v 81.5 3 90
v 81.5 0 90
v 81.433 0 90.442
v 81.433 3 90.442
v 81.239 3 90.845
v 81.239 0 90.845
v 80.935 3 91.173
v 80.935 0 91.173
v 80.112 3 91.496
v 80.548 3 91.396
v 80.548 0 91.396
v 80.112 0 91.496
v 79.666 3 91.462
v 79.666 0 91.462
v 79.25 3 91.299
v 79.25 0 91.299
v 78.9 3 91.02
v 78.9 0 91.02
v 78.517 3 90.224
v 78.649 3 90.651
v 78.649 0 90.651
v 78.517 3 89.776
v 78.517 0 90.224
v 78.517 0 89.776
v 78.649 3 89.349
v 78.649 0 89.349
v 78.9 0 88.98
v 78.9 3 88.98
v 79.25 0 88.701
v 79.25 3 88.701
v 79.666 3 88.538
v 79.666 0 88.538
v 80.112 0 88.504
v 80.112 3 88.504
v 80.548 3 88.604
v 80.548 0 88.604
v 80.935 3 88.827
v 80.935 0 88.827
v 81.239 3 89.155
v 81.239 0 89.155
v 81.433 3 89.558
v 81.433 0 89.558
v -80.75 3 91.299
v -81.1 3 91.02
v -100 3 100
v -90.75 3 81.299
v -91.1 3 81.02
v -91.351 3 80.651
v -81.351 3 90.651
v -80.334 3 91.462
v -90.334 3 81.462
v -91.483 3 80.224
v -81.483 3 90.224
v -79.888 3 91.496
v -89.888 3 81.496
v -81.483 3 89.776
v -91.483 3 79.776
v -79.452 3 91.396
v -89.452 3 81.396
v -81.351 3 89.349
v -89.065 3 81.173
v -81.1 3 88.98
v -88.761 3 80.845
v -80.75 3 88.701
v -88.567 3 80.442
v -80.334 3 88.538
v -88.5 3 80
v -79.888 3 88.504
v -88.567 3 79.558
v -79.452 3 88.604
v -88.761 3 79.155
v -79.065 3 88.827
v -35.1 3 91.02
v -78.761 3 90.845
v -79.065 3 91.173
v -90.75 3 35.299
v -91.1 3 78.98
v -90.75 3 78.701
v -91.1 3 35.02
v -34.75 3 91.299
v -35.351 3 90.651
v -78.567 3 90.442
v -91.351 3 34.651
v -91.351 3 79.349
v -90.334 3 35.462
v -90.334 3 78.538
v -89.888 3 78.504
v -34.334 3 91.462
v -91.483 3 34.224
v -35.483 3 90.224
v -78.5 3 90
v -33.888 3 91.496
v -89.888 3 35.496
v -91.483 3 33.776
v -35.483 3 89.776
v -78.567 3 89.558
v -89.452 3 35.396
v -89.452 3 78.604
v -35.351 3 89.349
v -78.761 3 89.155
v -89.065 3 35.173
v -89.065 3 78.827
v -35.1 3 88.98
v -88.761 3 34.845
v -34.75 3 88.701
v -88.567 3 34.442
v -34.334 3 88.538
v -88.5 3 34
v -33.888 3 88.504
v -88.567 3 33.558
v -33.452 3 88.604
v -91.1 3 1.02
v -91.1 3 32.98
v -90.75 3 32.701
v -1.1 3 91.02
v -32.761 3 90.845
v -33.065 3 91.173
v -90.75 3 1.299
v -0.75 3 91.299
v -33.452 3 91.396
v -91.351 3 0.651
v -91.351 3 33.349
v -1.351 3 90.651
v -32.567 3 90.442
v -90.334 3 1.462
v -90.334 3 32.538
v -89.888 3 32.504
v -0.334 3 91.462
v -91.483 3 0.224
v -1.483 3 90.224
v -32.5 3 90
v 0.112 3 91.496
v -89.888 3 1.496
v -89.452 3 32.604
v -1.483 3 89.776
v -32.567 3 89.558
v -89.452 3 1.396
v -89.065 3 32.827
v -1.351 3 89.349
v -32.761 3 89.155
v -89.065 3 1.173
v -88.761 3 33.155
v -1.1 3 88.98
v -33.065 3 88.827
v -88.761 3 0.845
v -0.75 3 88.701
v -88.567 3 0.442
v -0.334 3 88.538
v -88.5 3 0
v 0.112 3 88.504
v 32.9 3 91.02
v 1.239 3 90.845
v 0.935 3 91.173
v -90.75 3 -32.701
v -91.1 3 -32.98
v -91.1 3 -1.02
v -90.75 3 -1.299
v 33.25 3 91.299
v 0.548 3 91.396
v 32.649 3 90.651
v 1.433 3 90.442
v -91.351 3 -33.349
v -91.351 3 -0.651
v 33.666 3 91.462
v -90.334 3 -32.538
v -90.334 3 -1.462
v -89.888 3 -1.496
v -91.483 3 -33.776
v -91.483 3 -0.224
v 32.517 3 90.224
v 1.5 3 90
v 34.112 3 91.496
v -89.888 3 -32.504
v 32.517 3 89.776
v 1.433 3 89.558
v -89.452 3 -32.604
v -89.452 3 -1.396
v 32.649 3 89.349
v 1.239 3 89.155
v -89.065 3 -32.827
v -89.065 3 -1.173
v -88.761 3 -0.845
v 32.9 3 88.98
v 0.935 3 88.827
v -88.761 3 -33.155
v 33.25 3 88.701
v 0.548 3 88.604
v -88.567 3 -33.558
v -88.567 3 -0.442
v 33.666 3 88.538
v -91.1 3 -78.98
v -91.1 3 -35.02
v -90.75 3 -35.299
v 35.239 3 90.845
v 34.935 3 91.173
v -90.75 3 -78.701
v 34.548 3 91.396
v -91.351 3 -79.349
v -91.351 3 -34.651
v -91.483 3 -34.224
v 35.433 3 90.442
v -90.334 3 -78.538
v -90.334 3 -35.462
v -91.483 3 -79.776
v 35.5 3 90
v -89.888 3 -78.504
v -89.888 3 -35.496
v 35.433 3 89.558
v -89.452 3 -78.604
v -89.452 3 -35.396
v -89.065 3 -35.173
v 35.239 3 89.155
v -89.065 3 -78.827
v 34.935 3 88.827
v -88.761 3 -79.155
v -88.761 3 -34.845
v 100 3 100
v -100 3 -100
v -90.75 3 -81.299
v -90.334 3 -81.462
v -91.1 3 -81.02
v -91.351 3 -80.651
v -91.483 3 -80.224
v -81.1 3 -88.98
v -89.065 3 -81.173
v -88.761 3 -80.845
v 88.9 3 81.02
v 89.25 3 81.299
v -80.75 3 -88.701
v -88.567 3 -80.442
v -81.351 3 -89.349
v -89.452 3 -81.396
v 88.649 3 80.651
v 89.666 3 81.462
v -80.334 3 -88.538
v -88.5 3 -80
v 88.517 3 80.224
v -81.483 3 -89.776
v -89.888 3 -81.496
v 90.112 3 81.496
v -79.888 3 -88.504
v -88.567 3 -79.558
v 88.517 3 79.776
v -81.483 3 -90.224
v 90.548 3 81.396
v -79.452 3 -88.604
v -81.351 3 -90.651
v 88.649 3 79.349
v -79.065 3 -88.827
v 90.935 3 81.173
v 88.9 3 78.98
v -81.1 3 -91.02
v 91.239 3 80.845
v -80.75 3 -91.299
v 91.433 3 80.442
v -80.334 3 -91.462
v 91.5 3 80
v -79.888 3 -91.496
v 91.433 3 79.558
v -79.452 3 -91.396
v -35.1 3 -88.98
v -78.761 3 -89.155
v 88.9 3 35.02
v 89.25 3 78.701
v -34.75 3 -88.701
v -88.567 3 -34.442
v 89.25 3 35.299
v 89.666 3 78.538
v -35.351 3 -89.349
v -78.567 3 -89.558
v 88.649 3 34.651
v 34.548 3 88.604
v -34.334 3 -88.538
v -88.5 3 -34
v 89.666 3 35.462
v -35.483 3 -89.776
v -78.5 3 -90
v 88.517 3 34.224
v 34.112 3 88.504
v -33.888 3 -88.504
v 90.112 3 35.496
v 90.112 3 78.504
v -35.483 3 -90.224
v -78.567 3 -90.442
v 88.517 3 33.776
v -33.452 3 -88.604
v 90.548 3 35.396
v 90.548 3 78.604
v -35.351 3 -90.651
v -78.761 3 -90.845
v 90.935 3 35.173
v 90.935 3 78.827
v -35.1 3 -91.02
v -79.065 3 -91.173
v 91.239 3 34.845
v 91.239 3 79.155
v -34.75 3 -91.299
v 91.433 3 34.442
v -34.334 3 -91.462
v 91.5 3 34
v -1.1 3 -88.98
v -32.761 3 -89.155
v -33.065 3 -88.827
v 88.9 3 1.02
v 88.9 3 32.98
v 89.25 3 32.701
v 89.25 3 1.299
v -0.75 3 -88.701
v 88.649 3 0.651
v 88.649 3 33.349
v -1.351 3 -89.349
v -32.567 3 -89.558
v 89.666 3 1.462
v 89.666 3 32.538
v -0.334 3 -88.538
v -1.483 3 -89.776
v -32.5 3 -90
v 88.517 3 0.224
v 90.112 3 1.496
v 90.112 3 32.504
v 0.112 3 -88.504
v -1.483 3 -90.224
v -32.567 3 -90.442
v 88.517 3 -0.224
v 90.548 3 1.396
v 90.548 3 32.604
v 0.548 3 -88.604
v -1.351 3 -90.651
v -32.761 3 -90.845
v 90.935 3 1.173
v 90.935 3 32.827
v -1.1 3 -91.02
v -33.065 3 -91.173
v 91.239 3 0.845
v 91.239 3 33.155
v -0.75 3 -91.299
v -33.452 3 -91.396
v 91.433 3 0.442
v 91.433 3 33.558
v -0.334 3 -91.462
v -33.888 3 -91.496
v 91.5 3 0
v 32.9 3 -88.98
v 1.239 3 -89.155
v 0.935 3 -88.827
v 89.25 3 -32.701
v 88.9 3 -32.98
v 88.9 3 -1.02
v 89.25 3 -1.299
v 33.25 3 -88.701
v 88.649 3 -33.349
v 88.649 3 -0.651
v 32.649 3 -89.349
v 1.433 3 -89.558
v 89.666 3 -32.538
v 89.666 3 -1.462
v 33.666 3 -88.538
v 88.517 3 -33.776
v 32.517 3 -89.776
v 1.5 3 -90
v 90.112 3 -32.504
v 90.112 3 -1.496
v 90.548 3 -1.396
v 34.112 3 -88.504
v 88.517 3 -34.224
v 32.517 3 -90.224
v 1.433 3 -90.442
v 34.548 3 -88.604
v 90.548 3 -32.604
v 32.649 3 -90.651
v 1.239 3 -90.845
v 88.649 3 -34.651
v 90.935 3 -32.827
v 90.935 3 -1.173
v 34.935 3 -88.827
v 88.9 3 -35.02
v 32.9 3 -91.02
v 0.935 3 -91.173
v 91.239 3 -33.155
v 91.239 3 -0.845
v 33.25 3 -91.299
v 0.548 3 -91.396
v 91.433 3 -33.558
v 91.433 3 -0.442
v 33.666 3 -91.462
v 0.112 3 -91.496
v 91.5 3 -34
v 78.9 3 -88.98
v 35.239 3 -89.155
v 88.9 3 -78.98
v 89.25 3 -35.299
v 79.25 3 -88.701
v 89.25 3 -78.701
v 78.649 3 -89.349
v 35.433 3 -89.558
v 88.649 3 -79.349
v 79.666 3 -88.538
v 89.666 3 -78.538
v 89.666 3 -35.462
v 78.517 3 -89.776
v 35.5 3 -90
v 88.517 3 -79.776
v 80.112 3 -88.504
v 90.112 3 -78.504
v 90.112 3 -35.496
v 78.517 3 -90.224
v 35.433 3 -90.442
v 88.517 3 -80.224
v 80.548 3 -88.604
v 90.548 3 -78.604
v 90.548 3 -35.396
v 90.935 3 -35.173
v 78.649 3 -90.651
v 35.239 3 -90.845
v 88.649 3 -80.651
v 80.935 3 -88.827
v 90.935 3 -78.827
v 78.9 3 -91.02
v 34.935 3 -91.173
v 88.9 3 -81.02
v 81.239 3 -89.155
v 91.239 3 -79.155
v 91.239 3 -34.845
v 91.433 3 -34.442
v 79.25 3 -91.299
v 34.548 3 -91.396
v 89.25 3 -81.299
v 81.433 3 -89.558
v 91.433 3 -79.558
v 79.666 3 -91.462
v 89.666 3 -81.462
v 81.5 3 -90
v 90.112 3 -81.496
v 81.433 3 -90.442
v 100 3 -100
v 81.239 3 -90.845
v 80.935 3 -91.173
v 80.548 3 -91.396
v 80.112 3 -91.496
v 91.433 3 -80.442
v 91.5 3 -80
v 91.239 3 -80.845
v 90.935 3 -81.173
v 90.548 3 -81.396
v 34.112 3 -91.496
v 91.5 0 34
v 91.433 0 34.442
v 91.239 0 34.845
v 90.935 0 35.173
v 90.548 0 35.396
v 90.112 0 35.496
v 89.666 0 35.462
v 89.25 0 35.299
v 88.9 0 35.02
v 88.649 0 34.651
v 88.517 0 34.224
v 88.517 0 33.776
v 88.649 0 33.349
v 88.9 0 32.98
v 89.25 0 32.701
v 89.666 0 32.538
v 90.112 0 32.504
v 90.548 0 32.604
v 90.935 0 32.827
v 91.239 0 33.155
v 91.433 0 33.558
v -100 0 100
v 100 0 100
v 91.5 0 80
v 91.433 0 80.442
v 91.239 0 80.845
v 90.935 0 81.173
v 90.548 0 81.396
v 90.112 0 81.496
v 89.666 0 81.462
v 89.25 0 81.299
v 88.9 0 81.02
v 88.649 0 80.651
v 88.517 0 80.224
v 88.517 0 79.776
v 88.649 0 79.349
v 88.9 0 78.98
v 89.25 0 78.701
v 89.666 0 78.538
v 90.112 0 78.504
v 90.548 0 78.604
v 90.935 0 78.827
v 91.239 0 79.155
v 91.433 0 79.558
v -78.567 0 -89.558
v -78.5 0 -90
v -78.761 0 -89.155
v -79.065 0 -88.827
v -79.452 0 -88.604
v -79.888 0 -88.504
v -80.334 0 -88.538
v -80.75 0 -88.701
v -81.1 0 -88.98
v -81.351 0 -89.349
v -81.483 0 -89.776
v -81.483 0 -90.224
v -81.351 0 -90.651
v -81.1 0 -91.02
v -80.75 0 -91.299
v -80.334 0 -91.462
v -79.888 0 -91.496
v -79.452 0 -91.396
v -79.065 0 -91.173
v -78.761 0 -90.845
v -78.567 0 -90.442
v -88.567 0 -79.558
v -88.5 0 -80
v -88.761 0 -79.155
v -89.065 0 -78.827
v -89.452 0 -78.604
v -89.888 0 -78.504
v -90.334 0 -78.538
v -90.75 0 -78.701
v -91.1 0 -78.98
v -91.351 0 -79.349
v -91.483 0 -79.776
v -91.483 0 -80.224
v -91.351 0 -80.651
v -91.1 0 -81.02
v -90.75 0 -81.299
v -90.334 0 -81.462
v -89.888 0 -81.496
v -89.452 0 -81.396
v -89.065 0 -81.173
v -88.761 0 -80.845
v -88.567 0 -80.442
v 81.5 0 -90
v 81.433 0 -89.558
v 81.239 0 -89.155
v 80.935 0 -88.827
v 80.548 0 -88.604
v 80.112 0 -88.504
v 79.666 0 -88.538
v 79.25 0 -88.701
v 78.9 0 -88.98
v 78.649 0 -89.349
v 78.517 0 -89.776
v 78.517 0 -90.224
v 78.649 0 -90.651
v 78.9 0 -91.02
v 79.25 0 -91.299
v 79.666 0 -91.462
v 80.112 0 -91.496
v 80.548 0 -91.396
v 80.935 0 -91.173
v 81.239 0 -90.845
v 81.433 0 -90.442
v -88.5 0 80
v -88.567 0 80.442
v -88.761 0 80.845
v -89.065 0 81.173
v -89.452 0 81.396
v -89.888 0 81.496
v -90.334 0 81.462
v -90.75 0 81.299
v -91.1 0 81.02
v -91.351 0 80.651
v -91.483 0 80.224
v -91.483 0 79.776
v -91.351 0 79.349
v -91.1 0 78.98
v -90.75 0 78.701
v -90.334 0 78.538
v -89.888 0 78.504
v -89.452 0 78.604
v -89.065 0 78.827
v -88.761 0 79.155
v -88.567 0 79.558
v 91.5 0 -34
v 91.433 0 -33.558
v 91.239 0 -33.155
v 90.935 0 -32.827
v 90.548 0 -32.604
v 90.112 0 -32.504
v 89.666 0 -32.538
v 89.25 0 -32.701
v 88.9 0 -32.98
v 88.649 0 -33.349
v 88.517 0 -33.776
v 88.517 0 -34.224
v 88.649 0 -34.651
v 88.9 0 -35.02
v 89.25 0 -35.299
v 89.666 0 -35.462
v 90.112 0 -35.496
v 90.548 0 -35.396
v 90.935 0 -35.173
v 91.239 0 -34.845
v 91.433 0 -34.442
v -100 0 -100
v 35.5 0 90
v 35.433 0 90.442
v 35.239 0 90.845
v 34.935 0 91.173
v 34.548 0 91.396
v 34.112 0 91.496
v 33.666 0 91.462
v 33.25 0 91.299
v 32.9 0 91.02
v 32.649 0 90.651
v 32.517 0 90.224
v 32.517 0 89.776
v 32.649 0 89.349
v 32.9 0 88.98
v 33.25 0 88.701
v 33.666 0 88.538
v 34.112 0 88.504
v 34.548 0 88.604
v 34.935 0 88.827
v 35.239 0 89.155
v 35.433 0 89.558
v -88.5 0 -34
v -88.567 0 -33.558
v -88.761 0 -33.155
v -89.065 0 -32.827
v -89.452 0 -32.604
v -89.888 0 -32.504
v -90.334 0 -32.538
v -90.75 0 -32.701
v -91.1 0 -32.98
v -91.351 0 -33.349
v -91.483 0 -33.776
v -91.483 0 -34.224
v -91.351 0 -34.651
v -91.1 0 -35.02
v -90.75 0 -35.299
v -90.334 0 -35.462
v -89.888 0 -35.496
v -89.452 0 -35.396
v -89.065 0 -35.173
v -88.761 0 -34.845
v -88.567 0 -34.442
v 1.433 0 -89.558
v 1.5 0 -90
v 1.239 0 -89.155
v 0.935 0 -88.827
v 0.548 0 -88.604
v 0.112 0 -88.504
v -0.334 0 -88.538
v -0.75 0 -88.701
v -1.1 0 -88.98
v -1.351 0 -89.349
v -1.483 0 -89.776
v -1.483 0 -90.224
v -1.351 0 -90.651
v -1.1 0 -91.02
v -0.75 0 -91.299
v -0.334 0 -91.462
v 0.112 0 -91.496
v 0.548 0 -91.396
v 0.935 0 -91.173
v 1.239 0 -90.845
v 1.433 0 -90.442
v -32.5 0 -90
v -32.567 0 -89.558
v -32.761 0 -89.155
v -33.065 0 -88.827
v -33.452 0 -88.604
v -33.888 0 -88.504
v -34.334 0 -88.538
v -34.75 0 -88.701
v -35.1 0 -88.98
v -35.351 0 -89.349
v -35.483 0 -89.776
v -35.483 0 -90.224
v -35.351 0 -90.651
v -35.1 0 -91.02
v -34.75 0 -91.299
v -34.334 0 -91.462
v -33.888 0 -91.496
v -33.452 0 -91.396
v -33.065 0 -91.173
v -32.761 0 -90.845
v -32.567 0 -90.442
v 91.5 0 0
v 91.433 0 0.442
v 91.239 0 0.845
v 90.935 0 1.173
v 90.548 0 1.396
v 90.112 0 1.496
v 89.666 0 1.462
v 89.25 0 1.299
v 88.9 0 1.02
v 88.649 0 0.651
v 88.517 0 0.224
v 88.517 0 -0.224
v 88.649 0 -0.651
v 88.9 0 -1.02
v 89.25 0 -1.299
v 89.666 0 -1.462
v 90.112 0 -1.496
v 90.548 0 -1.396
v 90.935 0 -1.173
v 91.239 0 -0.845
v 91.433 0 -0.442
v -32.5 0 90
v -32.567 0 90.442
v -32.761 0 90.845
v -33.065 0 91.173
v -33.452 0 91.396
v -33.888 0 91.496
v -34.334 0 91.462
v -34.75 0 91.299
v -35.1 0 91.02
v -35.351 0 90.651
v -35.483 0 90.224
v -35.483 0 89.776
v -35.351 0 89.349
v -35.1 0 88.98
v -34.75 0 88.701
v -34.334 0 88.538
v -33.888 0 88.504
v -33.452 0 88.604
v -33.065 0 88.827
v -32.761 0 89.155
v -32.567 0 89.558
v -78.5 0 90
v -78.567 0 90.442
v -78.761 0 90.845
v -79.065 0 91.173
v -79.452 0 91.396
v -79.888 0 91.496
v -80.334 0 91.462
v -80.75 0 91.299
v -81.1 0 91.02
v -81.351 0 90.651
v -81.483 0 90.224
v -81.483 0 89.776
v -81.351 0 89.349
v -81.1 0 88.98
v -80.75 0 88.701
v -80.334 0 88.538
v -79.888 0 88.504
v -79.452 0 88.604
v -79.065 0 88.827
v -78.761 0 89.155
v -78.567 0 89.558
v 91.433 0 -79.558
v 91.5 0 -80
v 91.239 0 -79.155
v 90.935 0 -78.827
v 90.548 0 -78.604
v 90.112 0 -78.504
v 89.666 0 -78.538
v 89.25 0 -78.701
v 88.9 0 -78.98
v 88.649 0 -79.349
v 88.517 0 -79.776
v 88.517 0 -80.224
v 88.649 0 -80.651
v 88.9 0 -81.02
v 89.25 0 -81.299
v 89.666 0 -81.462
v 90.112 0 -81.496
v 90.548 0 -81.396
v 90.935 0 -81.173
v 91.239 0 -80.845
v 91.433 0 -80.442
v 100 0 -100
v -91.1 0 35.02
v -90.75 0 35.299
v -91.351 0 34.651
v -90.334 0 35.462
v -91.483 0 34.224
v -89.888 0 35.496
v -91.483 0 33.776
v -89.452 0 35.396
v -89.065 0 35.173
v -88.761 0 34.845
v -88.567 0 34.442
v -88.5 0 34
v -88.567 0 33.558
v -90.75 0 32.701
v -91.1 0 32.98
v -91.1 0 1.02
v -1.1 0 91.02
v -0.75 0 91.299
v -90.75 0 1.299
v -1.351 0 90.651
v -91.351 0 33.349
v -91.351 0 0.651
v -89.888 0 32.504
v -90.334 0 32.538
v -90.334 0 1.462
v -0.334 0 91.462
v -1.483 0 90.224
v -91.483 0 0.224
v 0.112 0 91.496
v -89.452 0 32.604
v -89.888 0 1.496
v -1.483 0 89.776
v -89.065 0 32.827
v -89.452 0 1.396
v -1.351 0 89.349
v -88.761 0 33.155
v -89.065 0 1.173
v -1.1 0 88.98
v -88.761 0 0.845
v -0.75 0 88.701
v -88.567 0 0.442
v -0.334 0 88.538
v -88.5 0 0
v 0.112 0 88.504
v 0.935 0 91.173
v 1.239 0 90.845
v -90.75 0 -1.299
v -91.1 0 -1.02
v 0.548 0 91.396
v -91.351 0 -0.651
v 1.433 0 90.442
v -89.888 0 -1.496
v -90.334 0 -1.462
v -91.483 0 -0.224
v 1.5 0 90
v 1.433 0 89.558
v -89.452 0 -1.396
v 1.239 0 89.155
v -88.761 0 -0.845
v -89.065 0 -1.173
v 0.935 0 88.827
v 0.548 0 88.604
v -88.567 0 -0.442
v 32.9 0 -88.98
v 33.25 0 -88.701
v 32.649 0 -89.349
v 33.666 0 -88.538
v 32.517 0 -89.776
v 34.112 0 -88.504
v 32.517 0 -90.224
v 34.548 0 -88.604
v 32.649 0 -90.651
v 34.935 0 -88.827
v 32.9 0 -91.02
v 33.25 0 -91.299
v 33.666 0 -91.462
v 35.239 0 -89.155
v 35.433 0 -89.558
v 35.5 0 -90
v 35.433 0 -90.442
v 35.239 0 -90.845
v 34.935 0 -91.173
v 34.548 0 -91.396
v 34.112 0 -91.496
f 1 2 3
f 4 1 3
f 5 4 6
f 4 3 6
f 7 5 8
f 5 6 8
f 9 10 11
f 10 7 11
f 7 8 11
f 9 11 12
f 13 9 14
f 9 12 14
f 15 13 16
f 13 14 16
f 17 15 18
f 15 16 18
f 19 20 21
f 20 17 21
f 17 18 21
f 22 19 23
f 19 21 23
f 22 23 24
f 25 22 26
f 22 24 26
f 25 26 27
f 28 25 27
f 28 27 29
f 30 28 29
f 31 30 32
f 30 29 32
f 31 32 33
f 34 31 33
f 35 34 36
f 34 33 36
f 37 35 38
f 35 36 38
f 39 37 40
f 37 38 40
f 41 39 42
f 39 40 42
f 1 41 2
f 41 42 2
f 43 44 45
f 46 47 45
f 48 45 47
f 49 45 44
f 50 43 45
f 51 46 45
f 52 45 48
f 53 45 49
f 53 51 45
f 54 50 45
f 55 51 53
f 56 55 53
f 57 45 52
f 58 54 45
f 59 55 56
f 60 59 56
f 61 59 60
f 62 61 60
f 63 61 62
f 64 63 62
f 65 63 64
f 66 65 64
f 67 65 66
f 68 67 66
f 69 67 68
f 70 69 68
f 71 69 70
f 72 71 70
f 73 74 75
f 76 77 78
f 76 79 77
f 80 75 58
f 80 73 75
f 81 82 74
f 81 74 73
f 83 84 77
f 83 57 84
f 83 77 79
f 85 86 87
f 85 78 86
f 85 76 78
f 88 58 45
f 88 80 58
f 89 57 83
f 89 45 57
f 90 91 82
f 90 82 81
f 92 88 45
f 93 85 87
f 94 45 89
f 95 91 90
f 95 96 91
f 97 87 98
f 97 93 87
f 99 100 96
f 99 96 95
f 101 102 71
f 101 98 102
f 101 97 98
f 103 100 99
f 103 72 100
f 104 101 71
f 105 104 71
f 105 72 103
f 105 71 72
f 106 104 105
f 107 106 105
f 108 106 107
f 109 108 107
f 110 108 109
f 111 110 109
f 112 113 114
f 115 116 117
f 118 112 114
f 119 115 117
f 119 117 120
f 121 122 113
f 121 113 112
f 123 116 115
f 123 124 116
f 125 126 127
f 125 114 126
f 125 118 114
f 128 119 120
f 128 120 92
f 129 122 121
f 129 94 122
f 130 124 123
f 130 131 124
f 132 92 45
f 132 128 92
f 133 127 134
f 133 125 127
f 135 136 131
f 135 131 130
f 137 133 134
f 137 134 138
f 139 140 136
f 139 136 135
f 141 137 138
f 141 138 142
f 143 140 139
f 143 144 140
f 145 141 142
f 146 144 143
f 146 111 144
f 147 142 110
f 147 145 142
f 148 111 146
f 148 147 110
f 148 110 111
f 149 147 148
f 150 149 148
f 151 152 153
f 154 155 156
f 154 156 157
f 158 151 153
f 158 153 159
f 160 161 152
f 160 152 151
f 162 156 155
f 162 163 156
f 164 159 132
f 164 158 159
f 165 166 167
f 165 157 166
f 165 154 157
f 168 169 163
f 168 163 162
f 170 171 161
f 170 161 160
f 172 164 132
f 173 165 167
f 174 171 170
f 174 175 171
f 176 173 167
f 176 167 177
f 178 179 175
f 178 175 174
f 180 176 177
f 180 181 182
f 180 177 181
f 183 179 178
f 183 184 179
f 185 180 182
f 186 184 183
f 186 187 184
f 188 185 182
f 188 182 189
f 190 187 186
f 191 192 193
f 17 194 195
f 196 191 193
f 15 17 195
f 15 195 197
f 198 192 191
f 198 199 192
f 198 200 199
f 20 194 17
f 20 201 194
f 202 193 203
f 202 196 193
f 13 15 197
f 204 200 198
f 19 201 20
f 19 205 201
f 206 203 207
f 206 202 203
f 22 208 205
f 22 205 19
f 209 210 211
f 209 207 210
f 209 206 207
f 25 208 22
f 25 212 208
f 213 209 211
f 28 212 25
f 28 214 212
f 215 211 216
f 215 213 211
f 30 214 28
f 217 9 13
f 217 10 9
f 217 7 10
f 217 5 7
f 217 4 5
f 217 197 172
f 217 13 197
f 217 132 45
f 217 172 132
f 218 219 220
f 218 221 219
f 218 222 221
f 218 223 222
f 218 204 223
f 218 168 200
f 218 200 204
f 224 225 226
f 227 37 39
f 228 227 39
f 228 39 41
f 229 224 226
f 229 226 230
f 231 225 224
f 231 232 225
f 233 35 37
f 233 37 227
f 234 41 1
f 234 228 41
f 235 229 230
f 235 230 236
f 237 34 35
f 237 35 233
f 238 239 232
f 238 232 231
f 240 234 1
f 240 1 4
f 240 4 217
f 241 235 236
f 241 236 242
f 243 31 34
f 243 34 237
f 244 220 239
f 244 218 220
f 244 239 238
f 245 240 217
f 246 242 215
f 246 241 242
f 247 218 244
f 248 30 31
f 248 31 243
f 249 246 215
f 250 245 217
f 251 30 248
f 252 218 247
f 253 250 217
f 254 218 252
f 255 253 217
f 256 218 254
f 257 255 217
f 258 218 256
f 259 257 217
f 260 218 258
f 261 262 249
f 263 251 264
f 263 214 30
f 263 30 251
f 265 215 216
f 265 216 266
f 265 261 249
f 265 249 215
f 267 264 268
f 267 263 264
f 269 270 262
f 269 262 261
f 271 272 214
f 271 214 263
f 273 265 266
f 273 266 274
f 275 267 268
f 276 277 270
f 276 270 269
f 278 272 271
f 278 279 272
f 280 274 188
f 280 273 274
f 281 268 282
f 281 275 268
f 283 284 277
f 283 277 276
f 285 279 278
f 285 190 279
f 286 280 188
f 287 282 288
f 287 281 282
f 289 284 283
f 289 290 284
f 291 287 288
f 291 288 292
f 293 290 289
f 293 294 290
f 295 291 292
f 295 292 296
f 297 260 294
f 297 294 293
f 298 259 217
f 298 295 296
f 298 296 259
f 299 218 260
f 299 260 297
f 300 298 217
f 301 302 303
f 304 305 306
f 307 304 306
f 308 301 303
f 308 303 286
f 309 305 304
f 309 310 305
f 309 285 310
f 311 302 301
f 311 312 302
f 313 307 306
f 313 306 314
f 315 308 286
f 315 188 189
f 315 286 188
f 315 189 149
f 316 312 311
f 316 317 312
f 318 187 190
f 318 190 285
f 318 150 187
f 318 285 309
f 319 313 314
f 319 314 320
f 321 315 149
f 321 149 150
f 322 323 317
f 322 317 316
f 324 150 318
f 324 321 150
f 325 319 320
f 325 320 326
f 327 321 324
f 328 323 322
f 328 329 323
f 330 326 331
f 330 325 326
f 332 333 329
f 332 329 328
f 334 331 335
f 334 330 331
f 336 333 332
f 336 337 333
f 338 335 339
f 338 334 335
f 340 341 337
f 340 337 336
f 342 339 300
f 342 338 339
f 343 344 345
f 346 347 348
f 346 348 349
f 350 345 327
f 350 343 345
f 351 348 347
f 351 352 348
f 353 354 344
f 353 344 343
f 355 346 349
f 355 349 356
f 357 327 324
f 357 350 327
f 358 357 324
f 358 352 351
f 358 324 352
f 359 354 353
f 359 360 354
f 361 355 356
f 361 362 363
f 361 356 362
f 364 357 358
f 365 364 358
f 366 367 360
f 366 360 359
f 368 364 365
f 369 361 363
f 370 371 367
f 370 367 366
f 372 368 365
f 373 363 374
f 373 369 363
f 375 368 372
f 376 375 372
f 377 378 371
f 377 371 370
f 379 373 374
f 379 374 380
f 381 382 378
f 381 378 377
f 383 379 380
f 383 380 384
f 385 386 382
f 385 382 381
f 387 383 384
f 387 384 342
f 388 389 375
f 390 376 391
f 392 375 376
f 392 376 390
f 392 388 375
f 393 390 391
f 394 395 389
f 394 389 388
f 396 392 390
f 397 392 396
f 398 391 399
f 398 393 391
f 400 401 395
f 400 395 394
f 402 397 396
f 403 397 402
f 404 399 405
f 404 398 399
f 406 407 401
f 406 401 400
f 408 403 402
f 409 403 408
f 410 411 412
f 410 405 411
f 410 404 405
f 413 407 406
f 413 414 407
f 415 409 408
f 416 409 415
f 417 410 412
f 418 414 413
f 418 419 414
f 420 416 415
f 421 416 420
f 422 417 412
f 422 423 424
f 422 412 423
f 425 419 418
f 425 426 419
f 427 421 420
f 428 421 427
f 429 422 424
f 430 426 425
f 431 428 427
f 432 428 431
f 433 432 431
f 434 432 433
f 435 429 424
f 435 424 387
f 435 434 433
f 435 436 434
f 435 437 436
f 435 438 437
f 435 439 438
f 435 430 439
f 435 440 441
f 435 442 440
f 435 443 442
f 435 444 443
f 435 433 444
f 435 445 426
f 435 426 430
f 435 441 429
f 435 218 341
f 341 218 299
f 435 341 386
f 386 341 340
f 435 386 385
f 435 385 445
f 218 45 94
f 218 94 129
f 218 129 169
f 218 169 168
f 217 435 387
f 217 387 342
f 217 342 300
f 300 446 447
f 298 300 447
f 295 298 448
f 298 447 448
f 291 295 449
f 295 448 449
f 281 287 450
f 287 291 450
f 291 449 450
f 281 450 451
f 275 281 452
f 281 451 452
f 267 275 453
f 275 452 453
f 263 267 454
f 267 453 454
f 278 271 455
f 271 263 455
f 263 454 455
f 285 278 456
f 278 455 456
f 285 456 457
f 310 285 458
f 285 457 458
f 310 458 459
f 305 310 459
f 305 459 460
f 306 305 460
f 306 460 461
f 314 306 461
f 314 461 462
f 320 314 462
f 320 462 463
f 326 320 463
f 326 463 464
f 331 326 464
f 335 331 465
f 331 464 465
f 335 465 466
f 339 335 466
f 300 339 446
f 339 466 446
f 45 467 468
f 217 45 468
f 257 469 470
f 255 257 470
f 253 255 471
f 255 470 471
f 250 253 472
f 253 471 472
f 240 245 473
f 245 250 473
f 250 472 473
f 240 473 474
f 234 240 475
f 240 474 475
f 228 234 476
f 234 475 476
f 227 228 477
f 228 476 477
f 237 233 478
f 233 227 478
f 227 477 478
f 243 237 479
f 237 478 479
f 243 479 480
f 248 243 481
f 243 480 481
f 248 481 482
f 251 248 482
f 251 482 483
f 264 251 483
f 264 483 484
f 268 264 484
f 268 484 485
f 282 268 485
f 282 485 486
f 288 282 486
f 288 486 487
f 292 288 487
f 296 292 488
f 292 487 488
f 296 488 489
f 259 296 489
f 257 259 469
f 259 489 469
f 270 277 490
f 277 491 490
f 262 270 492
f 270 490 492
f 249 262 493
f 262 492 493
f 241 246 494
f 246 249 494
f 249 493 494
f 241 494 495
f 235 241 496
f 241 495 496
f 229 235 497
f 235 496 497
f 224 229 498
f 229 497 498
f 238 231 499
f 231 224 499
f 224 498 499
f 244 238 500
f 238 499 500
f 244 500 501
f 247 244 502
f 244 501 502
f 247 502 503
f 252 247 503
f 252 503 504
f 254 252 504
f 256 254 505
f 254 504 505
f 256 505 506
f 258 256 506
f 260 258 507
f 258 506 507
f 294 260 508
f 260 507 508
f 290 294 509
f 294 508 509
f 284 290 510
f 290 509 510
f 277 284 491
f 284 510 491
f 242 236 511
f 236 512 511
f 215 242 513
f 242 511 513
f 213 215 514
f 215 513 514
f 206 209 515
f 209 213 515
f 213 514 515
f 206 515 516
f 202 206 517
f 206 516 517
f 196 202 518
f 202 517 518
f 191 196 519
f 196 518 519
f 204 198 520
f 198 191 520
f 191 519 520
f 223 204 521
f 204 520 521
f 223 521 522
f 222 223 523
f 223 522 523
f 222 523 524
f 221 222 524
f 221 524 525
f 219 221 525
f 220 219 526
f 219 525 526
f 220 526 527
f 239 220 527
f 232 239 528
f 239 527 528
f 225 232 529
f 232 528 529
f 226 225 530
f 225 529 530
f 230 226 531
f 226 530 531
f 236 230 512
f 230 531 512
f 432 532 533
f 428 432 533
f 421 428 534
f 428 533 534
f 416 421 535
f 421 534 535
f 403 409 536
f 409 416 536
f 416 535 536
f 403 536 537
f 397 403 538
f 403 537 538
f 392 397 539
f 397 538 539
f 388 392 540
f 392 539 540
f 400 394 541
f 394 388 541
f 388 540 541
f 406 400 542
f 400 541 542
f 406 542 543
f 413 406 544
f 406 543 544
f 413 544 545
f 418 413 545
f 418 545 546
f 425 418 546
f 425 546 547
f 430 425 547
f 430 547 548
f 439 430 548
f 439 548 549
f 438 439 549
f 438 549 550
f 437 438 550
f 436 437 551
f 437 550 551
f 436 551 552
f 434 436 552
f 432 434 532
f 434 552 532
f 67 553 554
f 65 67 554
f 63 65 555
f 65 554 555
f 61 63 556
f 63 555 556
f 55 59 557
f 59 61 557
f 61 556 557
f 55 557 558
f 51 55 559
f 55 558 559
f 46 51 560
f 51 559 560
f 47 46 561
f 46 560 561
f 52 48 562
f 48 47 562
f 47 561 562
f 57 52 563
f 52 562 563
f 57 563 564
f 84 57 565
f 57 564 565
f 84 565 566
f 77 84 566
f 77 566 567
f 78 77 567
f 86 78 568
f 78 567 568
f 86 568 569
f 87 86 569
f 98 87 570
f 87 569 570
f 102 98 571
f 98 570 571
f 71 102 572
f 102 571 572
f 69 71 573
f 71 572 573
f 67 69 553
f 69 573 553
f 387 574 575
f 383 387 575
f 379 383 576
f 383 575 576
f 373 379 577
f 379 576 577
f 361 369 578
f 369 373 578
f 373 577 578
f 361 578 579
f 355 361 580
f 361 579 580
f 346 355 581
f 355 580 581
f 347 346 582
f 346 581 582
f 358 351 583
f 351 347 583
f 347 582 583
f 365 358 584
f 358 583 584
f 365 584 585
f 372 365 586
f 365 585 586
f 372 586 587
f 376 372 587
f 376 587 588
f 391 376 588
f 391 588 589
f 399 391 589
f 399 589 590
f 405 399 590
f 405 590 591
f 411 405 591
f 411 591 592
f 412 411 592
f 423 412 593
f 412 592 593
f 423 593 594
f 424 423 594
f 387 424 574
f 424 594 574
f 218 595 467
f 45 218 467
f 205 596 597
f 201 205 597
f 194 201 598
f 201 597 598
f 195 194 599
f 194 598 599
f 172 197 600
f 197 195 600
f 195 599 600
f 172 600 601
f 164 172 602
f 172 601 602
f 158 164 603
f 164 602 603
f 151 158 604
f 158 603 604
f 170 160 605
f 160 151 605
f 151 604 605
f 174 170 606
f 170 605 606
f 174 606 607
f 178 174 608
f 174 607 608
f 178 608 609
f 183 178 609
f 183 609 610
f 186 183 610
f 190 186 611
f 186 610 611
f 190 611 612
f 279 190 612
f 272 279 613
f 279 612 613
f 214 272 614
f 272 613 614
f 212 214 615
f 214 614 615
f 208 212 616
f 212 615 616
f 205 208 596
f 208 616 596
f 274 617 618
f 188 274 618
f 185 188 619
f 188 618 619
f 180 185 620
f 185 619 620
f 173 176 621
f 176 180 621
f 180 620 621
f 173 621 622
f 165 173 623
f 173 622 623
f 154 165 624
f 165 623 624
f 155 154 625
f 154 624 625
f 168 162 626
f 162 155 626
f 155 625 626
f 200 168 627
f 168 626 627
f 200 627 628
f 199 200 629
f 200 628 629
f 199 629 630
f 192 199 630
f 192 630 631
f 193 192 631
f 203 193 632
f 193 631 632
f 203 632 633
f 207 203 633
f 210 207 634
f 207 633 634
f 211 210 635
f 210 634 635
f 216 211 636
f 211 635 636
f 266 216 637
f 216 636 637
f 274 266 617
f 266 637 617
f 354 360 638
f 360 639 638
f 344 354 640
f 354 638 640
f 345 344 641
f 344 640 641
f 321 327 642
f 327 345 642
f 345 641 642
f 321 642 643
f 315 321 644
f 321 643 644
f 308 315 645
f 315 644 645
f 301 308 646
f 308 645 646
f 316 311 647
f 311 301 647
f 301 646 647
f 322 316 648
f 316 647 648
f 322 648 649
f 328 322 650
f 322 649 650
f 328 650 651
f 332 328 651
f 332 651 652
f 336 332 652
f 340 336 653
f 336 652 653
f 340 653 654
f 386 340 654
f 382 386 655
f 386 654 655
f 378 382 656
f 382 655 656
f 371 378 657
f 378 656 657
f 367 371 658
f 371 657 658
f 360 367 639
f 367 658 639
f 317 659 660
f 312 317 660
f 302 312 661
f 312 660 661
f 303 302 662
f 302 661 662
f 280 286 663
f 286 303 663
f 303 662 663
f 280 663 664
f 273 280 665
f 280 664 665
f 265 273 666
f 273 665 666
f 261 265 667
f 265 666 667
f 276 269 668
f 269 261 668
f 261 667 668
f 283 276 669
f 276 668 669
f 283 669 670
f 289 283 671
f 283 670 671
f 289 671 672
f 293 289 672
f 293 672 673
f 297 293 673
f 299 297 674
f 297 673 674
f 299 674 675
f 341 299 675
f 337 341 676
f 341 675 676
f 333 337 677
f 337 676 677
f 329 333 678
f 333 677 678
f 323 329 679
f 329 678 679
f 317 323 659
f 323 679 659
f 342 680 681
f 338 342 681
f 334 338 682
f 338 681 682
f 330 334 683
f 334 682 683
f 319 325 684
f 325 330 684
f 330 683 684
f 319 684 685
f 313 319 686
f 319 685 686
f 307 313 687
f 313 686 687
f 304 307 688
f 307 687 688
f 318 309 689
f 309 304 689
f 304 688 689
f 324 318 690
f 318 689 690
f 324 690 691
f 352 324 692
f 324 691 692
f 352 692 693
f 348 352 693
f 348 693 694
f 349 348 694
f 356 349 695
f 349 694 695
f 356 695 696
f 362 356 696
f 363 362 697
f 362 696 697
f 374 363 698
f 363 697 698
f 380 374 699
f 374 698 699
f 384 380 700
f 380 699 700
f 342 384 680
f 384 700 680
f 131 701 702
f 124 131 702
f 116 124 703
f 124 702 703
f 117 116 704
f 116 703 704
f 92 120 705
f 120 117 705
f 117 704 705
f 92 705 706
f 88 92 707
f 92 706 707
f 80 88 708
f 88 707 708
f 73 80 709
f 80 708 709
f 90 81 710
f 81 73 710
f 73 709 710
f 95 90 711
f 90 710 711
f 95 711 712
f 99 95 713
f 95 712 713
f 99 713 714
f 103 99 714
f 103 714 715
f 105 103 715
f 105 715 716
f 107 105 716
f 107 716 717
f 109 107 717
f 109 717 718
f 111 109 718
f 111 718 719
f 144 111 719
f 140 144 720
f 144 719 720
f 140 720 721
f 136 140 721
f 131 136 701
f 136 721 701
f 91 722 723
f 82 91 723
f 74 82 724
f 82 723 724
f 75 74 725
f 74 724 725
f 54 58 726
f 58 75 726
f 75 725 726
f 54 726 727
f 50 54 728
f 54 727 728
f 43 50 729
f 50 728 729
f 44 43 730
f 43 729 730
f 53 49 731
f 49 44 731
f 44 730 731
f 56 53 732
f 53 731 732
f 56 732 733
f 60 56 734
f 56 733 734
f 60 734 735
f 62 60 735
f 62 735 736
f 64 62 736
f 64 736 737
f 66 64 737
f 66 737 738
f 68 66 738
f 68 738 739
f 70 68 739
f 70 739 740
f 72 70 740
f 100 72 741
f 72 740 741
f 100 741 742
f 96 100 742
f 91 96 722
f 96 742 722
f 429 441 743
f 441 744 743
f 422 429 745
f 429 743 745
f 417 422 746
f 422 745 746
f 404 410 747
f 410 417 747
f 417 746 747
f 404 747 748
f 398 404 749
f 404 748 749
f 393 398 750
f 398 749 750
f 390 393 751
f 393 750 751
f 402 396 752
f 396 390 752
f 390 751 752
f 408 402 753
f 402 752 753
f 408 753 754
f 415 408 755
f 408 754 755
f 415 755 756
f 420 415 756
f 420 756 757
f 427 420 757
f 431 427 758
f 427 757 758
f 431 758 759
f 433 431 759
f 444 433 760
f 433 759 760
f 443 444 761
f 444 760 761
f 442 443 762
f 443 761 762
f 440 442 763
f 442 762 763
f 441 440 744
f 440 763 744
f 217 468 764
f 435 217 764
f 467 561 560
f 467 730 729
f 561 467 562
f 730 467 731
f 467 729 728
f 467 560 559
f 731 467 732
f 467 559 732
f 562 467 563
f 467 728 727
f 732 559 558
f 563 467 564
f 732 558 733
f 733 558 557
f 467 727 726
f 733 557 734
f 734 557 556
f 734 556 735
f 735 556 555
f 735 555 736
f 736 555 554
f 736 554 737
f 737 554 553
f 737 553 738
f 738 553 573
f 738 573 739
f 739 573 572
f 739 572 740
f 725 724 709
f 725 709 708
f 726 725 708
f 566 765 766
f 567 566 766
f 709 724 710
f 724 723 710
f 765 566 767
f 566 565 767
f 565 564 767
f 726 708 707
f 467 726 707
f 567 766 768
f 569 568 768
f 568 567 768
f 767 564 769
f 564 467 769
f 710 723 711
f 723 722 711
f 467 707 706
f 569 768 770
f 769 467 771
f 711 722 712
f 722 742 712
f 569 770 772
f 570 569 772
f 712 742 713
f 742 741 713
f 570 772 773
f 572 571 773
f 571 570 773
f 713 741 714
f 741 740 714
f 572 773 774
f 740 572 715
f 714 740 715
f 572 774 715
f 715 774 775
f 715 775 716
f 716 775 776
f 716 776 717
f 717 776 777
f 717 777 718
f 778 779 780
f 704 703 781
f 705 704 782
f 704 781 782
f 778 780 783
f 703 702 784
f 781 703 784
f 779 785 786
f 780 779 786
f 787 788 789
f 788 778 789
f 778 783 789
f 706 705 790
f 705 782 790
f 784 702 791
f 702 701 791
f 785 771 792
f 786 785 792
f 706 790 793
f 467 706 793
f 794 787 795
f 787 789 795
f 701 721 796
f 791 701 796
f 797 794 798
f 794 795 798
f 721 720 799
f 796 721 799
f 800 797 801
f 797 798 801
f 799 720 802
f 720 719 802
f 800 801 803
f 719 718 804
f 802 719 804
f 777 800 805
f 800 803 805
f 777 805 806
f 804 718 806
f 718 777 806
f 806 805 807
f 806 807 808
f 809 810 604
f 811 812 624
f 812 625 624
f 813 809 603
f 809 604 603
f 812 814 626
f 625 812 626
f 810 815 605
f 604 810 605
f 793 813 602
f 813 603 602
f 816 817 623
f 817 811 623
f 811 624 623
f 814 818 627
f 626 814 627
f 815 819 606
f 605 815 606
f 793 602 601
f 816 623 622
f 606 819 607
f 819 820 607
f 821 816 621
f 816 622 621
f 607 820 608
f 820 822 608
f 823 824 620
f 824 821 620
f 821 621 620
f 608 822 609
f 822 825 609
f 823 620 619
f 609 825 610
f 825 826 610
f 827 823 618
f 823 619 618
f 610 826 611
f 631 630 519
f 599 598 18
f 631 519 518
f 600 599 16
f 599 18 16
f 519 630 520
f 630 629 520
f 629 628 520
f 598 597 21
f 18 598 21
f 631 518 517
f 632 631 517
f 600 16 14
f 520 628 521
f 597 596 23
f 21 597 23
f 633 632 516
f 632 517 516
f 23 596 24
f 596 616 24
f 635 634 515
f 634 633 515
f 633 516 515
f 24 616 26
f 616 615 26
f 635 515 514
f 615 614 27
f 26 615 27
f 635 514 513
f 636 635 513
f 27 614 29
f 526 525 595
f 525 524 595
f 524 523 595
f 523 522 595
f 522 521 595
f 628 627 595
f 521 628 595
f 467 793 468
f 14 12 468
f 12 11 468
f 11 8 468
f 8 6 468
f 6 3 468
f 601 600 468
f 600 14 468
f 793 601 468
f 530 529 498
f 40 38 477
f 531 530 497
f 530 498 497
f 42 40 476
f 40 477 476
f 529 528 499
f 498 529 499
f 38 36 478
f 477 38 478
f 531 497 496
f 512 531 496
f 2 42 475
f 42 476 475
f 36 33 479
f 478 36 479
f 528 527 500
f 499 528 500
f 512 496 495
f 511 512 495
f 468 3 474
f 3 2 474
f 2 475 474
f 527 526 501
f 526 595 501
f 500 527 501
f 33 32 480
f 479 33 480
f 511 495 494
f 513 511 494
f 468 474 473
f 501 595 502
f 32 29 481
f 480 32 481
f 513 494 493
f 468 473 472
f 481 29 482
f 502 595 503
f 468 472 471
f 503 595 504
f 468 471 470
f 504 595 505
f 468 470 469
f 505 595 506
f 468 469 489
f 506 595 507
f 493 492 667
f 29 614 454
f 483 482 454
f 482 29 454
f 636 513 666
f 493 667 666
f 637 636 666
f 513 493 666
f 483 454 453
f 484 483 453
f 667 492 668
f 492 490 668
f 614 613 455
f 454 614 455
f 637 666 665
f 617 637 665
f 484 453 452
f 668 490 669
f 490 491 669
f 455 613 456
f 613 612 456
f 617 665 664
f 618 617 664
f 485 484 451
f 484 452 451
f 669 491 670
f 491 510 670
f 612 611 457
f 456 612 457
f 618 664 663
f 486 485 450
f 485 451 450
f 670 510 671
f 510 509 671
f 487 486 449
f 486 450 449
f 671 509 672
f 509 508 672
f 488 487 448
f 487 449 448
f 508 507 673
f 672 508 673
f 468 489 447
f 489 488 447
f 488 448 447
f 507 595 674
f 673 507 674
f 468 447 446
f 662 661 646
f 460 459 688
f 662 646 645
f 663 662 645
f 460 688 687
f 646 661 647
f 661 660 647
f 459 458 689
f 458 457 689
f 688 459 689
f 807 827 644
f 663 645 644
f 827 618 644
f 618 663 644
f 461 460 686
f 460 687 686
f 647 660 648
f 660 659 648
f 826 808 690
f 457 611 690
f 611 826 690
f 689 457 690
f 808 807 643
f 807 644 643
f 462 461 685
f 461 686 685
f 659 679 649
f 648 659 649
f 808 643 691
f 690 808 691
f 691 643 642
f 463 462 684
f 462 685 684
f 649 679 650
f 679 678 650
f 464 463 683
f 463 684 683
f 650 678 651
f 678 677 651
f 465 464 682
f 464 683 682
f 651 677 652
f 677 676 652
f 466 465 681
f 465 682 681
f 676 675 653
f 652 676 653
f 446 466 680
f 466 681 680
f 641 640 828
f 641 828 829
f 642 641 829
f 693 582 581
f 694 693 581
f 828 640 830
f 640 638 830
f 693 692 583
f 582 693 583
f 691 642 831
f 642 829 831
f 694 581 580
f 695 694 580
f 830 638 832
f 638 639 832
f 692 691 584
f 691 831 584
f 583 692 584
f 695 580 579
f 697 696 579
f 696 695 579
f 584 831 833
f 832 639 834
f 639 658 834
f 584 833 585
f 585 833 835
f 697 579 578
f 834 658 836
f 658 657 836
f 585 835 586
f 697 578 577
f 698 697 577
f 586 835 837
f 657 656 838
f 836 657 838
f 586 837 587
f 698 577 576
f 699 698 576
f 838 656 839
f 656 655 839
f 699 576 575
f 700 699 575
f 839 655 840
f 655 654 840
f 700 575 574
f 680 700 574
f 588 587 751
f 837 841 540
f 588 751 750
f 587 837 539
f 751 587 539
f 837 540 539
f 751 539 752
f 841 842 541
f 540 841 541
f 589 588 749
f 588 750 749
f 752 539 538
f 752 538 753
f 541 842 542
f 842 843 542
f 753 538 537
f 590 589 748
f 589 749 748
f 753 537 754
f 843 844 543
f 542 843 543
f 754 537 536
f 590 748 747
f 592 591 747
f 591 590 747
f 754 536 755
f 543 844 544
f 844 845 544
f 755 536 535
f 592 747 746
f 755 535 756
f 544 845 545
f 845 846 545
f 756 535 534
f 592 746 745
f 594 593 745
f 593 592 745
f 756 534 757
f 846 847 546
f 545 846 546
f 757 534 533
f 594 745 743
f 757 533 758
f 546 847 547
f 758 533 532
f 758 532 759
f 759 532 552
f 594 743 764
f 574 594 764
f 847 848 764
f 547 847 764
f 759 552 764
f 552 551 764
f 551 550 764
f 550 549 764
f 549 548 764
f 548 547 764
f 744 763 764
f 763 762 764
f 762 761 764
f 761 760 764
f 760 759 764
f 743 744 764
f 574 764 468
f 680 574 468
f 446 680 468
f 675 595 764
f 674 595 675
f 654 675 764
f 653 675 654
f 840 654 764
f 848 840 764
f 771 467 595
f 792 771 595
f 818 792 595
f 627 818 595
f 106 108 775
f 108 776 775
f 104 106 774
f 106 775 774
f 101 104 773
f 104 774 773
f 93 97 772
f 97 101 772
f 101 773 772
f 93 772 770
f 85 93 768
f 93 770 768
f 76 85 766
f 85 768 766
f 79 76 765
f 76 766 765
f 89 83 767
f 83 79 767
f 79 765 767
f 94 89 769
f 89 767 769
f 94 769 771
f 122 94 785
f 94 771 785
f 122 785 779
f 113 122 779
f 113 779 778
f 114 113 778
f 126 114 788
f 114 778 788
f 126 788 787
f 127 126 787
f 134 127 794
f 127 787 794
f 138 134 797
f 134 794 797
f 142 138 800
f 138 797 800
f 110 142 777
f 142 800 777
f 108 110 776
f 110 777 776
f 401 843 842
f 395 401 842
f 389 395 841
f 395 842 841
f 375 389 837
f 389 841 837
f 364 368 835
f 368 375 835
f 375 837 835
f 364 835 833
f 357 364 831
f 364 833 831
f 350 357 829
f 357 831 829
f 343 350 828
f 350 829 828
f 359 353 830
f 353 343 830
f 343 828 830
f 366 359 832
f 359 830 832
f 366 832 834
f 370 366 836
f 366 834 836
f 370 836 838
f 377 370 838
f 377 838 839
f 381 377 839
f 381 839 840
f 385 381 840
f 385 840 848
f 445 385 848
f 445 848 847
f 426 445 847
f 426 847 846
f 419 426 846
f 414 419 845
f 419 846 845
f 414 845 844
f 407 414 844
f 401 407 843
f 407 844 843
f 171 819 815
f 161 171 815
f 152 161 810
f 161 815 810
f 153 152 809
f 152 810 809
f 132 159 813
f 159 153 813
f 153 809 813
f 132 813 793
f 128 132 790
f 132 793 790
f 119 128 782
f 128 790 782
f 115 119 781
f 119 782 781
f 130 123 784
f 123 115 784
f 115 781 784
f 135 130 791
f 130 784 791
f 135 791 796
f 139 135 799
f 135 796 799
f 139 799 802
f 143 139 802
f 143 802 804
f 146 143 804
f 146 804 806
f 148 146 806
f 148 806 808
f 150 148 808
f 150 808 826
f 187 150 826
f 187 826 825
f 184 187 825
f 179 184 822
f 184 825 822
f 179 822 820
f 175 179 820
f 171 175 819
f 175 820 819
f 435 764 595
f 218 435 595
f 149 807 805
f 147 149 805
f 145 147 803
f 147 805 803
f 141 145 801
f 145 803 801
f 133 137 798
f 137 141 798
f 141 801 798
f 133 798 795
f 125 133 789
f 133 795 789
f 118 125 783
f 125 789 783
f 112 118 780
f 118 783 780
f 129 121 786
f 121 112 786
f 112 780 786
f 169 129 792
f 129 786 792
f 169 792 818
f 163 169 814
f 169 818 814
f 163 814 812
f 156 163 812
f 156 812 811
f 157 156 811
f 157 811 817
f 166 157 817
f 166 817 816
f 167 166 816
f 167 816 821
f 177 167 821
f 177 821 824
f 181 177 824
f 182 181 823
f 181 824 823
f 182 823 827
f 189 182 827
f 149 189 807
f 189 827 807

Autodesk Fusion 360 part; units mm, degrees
sketch "Sketch1" plane through (0, 0, 0) normal (0, 1, 0) x (1, 0, 0)
  line L0 (100, 100) -> (-100, 100)
  line L1 (-100, 100) -> (-100, -100)
  line L2 (-100, -100) -> (100, -100)
  line L3 (100, -100) -> (100, 100)
  line L4 (100, 100) -> (-100, -100) construction
  line L5 (-100, 100) -> (100, -100) construction
  circle A0 centre (90, -80) radius 1.5
  circle A1 centre (90, 0) radius 1.5
  circle A2 centre (90, 80) radius 1.5
  circle A3 centre (-90, 80) radius 1.5
  circle A4 centre (-90, 0) radius 1.5
  circle A5 centre (-90, -80) radius 1.5
  circle A6 centre (-34, -90) radius 1.5
  circle A7 centre (34, -90) radius 1.5
  circle A8 centre (-34, 90) radius 1.5
  circle A9 centre (34, 90) radius 1.5
  circle A10 centre (-90, 34) radius 1.5
  circle A11 centre (-80, 90) radius 1.5
  circle A12 centre (80, -90) radius 1.5
  circle A13 centre (90, 34) radius 1.5
  circle A14 centre (-90, -34) radius 1.5
  circle A15 centre (80, 90) radius 1.5
  circle A16 centre (0, 90) radius 1.5
  circle A17 centre (0, -90) radius 1.5
  circle A18 centre (-80, -90) radius 1.5
  circle A19 centre (90, -34) radius 1.5
  dimension "d1" = 200
  dimension "d2" = 200
  dimension "d3" = 3
  dimension "d4" = 3
  dimension "d5" = 3
  dimension "d6" = 3
  dimension "d7" = 3
  dimension "d8" = 3
  dimension "d9" = 10
  dimension "d10" = 20
  dimension "d11" = 10
  dimension "d12" = 10
  dimension "d13" = 20
  dimension "d14" = 100
  dimension "d15" = 10
  dimension "d16" = 20
  dimension "d17" = 100
  dimension "d18" = 10
  dimension "d19" = 10
  dimension "d20" = 20
  dimension "d21" = 3
  dimension "d22" = 3
  dimension "d23" = 3
  dimension "d24" = 3
  dimension "d25" = 10
  dimension "d26" = 10
  dimension "d27" = 66
  dimension "d28" = 66
  dimension "d29" = 10
  dimension "d30" = 10
  dimension "d31" = 66
  dimension "d32" = 66
  dimension "d34" = 90
extrude "Extrude1" add sketch "Sketch1" along normal blind 3
